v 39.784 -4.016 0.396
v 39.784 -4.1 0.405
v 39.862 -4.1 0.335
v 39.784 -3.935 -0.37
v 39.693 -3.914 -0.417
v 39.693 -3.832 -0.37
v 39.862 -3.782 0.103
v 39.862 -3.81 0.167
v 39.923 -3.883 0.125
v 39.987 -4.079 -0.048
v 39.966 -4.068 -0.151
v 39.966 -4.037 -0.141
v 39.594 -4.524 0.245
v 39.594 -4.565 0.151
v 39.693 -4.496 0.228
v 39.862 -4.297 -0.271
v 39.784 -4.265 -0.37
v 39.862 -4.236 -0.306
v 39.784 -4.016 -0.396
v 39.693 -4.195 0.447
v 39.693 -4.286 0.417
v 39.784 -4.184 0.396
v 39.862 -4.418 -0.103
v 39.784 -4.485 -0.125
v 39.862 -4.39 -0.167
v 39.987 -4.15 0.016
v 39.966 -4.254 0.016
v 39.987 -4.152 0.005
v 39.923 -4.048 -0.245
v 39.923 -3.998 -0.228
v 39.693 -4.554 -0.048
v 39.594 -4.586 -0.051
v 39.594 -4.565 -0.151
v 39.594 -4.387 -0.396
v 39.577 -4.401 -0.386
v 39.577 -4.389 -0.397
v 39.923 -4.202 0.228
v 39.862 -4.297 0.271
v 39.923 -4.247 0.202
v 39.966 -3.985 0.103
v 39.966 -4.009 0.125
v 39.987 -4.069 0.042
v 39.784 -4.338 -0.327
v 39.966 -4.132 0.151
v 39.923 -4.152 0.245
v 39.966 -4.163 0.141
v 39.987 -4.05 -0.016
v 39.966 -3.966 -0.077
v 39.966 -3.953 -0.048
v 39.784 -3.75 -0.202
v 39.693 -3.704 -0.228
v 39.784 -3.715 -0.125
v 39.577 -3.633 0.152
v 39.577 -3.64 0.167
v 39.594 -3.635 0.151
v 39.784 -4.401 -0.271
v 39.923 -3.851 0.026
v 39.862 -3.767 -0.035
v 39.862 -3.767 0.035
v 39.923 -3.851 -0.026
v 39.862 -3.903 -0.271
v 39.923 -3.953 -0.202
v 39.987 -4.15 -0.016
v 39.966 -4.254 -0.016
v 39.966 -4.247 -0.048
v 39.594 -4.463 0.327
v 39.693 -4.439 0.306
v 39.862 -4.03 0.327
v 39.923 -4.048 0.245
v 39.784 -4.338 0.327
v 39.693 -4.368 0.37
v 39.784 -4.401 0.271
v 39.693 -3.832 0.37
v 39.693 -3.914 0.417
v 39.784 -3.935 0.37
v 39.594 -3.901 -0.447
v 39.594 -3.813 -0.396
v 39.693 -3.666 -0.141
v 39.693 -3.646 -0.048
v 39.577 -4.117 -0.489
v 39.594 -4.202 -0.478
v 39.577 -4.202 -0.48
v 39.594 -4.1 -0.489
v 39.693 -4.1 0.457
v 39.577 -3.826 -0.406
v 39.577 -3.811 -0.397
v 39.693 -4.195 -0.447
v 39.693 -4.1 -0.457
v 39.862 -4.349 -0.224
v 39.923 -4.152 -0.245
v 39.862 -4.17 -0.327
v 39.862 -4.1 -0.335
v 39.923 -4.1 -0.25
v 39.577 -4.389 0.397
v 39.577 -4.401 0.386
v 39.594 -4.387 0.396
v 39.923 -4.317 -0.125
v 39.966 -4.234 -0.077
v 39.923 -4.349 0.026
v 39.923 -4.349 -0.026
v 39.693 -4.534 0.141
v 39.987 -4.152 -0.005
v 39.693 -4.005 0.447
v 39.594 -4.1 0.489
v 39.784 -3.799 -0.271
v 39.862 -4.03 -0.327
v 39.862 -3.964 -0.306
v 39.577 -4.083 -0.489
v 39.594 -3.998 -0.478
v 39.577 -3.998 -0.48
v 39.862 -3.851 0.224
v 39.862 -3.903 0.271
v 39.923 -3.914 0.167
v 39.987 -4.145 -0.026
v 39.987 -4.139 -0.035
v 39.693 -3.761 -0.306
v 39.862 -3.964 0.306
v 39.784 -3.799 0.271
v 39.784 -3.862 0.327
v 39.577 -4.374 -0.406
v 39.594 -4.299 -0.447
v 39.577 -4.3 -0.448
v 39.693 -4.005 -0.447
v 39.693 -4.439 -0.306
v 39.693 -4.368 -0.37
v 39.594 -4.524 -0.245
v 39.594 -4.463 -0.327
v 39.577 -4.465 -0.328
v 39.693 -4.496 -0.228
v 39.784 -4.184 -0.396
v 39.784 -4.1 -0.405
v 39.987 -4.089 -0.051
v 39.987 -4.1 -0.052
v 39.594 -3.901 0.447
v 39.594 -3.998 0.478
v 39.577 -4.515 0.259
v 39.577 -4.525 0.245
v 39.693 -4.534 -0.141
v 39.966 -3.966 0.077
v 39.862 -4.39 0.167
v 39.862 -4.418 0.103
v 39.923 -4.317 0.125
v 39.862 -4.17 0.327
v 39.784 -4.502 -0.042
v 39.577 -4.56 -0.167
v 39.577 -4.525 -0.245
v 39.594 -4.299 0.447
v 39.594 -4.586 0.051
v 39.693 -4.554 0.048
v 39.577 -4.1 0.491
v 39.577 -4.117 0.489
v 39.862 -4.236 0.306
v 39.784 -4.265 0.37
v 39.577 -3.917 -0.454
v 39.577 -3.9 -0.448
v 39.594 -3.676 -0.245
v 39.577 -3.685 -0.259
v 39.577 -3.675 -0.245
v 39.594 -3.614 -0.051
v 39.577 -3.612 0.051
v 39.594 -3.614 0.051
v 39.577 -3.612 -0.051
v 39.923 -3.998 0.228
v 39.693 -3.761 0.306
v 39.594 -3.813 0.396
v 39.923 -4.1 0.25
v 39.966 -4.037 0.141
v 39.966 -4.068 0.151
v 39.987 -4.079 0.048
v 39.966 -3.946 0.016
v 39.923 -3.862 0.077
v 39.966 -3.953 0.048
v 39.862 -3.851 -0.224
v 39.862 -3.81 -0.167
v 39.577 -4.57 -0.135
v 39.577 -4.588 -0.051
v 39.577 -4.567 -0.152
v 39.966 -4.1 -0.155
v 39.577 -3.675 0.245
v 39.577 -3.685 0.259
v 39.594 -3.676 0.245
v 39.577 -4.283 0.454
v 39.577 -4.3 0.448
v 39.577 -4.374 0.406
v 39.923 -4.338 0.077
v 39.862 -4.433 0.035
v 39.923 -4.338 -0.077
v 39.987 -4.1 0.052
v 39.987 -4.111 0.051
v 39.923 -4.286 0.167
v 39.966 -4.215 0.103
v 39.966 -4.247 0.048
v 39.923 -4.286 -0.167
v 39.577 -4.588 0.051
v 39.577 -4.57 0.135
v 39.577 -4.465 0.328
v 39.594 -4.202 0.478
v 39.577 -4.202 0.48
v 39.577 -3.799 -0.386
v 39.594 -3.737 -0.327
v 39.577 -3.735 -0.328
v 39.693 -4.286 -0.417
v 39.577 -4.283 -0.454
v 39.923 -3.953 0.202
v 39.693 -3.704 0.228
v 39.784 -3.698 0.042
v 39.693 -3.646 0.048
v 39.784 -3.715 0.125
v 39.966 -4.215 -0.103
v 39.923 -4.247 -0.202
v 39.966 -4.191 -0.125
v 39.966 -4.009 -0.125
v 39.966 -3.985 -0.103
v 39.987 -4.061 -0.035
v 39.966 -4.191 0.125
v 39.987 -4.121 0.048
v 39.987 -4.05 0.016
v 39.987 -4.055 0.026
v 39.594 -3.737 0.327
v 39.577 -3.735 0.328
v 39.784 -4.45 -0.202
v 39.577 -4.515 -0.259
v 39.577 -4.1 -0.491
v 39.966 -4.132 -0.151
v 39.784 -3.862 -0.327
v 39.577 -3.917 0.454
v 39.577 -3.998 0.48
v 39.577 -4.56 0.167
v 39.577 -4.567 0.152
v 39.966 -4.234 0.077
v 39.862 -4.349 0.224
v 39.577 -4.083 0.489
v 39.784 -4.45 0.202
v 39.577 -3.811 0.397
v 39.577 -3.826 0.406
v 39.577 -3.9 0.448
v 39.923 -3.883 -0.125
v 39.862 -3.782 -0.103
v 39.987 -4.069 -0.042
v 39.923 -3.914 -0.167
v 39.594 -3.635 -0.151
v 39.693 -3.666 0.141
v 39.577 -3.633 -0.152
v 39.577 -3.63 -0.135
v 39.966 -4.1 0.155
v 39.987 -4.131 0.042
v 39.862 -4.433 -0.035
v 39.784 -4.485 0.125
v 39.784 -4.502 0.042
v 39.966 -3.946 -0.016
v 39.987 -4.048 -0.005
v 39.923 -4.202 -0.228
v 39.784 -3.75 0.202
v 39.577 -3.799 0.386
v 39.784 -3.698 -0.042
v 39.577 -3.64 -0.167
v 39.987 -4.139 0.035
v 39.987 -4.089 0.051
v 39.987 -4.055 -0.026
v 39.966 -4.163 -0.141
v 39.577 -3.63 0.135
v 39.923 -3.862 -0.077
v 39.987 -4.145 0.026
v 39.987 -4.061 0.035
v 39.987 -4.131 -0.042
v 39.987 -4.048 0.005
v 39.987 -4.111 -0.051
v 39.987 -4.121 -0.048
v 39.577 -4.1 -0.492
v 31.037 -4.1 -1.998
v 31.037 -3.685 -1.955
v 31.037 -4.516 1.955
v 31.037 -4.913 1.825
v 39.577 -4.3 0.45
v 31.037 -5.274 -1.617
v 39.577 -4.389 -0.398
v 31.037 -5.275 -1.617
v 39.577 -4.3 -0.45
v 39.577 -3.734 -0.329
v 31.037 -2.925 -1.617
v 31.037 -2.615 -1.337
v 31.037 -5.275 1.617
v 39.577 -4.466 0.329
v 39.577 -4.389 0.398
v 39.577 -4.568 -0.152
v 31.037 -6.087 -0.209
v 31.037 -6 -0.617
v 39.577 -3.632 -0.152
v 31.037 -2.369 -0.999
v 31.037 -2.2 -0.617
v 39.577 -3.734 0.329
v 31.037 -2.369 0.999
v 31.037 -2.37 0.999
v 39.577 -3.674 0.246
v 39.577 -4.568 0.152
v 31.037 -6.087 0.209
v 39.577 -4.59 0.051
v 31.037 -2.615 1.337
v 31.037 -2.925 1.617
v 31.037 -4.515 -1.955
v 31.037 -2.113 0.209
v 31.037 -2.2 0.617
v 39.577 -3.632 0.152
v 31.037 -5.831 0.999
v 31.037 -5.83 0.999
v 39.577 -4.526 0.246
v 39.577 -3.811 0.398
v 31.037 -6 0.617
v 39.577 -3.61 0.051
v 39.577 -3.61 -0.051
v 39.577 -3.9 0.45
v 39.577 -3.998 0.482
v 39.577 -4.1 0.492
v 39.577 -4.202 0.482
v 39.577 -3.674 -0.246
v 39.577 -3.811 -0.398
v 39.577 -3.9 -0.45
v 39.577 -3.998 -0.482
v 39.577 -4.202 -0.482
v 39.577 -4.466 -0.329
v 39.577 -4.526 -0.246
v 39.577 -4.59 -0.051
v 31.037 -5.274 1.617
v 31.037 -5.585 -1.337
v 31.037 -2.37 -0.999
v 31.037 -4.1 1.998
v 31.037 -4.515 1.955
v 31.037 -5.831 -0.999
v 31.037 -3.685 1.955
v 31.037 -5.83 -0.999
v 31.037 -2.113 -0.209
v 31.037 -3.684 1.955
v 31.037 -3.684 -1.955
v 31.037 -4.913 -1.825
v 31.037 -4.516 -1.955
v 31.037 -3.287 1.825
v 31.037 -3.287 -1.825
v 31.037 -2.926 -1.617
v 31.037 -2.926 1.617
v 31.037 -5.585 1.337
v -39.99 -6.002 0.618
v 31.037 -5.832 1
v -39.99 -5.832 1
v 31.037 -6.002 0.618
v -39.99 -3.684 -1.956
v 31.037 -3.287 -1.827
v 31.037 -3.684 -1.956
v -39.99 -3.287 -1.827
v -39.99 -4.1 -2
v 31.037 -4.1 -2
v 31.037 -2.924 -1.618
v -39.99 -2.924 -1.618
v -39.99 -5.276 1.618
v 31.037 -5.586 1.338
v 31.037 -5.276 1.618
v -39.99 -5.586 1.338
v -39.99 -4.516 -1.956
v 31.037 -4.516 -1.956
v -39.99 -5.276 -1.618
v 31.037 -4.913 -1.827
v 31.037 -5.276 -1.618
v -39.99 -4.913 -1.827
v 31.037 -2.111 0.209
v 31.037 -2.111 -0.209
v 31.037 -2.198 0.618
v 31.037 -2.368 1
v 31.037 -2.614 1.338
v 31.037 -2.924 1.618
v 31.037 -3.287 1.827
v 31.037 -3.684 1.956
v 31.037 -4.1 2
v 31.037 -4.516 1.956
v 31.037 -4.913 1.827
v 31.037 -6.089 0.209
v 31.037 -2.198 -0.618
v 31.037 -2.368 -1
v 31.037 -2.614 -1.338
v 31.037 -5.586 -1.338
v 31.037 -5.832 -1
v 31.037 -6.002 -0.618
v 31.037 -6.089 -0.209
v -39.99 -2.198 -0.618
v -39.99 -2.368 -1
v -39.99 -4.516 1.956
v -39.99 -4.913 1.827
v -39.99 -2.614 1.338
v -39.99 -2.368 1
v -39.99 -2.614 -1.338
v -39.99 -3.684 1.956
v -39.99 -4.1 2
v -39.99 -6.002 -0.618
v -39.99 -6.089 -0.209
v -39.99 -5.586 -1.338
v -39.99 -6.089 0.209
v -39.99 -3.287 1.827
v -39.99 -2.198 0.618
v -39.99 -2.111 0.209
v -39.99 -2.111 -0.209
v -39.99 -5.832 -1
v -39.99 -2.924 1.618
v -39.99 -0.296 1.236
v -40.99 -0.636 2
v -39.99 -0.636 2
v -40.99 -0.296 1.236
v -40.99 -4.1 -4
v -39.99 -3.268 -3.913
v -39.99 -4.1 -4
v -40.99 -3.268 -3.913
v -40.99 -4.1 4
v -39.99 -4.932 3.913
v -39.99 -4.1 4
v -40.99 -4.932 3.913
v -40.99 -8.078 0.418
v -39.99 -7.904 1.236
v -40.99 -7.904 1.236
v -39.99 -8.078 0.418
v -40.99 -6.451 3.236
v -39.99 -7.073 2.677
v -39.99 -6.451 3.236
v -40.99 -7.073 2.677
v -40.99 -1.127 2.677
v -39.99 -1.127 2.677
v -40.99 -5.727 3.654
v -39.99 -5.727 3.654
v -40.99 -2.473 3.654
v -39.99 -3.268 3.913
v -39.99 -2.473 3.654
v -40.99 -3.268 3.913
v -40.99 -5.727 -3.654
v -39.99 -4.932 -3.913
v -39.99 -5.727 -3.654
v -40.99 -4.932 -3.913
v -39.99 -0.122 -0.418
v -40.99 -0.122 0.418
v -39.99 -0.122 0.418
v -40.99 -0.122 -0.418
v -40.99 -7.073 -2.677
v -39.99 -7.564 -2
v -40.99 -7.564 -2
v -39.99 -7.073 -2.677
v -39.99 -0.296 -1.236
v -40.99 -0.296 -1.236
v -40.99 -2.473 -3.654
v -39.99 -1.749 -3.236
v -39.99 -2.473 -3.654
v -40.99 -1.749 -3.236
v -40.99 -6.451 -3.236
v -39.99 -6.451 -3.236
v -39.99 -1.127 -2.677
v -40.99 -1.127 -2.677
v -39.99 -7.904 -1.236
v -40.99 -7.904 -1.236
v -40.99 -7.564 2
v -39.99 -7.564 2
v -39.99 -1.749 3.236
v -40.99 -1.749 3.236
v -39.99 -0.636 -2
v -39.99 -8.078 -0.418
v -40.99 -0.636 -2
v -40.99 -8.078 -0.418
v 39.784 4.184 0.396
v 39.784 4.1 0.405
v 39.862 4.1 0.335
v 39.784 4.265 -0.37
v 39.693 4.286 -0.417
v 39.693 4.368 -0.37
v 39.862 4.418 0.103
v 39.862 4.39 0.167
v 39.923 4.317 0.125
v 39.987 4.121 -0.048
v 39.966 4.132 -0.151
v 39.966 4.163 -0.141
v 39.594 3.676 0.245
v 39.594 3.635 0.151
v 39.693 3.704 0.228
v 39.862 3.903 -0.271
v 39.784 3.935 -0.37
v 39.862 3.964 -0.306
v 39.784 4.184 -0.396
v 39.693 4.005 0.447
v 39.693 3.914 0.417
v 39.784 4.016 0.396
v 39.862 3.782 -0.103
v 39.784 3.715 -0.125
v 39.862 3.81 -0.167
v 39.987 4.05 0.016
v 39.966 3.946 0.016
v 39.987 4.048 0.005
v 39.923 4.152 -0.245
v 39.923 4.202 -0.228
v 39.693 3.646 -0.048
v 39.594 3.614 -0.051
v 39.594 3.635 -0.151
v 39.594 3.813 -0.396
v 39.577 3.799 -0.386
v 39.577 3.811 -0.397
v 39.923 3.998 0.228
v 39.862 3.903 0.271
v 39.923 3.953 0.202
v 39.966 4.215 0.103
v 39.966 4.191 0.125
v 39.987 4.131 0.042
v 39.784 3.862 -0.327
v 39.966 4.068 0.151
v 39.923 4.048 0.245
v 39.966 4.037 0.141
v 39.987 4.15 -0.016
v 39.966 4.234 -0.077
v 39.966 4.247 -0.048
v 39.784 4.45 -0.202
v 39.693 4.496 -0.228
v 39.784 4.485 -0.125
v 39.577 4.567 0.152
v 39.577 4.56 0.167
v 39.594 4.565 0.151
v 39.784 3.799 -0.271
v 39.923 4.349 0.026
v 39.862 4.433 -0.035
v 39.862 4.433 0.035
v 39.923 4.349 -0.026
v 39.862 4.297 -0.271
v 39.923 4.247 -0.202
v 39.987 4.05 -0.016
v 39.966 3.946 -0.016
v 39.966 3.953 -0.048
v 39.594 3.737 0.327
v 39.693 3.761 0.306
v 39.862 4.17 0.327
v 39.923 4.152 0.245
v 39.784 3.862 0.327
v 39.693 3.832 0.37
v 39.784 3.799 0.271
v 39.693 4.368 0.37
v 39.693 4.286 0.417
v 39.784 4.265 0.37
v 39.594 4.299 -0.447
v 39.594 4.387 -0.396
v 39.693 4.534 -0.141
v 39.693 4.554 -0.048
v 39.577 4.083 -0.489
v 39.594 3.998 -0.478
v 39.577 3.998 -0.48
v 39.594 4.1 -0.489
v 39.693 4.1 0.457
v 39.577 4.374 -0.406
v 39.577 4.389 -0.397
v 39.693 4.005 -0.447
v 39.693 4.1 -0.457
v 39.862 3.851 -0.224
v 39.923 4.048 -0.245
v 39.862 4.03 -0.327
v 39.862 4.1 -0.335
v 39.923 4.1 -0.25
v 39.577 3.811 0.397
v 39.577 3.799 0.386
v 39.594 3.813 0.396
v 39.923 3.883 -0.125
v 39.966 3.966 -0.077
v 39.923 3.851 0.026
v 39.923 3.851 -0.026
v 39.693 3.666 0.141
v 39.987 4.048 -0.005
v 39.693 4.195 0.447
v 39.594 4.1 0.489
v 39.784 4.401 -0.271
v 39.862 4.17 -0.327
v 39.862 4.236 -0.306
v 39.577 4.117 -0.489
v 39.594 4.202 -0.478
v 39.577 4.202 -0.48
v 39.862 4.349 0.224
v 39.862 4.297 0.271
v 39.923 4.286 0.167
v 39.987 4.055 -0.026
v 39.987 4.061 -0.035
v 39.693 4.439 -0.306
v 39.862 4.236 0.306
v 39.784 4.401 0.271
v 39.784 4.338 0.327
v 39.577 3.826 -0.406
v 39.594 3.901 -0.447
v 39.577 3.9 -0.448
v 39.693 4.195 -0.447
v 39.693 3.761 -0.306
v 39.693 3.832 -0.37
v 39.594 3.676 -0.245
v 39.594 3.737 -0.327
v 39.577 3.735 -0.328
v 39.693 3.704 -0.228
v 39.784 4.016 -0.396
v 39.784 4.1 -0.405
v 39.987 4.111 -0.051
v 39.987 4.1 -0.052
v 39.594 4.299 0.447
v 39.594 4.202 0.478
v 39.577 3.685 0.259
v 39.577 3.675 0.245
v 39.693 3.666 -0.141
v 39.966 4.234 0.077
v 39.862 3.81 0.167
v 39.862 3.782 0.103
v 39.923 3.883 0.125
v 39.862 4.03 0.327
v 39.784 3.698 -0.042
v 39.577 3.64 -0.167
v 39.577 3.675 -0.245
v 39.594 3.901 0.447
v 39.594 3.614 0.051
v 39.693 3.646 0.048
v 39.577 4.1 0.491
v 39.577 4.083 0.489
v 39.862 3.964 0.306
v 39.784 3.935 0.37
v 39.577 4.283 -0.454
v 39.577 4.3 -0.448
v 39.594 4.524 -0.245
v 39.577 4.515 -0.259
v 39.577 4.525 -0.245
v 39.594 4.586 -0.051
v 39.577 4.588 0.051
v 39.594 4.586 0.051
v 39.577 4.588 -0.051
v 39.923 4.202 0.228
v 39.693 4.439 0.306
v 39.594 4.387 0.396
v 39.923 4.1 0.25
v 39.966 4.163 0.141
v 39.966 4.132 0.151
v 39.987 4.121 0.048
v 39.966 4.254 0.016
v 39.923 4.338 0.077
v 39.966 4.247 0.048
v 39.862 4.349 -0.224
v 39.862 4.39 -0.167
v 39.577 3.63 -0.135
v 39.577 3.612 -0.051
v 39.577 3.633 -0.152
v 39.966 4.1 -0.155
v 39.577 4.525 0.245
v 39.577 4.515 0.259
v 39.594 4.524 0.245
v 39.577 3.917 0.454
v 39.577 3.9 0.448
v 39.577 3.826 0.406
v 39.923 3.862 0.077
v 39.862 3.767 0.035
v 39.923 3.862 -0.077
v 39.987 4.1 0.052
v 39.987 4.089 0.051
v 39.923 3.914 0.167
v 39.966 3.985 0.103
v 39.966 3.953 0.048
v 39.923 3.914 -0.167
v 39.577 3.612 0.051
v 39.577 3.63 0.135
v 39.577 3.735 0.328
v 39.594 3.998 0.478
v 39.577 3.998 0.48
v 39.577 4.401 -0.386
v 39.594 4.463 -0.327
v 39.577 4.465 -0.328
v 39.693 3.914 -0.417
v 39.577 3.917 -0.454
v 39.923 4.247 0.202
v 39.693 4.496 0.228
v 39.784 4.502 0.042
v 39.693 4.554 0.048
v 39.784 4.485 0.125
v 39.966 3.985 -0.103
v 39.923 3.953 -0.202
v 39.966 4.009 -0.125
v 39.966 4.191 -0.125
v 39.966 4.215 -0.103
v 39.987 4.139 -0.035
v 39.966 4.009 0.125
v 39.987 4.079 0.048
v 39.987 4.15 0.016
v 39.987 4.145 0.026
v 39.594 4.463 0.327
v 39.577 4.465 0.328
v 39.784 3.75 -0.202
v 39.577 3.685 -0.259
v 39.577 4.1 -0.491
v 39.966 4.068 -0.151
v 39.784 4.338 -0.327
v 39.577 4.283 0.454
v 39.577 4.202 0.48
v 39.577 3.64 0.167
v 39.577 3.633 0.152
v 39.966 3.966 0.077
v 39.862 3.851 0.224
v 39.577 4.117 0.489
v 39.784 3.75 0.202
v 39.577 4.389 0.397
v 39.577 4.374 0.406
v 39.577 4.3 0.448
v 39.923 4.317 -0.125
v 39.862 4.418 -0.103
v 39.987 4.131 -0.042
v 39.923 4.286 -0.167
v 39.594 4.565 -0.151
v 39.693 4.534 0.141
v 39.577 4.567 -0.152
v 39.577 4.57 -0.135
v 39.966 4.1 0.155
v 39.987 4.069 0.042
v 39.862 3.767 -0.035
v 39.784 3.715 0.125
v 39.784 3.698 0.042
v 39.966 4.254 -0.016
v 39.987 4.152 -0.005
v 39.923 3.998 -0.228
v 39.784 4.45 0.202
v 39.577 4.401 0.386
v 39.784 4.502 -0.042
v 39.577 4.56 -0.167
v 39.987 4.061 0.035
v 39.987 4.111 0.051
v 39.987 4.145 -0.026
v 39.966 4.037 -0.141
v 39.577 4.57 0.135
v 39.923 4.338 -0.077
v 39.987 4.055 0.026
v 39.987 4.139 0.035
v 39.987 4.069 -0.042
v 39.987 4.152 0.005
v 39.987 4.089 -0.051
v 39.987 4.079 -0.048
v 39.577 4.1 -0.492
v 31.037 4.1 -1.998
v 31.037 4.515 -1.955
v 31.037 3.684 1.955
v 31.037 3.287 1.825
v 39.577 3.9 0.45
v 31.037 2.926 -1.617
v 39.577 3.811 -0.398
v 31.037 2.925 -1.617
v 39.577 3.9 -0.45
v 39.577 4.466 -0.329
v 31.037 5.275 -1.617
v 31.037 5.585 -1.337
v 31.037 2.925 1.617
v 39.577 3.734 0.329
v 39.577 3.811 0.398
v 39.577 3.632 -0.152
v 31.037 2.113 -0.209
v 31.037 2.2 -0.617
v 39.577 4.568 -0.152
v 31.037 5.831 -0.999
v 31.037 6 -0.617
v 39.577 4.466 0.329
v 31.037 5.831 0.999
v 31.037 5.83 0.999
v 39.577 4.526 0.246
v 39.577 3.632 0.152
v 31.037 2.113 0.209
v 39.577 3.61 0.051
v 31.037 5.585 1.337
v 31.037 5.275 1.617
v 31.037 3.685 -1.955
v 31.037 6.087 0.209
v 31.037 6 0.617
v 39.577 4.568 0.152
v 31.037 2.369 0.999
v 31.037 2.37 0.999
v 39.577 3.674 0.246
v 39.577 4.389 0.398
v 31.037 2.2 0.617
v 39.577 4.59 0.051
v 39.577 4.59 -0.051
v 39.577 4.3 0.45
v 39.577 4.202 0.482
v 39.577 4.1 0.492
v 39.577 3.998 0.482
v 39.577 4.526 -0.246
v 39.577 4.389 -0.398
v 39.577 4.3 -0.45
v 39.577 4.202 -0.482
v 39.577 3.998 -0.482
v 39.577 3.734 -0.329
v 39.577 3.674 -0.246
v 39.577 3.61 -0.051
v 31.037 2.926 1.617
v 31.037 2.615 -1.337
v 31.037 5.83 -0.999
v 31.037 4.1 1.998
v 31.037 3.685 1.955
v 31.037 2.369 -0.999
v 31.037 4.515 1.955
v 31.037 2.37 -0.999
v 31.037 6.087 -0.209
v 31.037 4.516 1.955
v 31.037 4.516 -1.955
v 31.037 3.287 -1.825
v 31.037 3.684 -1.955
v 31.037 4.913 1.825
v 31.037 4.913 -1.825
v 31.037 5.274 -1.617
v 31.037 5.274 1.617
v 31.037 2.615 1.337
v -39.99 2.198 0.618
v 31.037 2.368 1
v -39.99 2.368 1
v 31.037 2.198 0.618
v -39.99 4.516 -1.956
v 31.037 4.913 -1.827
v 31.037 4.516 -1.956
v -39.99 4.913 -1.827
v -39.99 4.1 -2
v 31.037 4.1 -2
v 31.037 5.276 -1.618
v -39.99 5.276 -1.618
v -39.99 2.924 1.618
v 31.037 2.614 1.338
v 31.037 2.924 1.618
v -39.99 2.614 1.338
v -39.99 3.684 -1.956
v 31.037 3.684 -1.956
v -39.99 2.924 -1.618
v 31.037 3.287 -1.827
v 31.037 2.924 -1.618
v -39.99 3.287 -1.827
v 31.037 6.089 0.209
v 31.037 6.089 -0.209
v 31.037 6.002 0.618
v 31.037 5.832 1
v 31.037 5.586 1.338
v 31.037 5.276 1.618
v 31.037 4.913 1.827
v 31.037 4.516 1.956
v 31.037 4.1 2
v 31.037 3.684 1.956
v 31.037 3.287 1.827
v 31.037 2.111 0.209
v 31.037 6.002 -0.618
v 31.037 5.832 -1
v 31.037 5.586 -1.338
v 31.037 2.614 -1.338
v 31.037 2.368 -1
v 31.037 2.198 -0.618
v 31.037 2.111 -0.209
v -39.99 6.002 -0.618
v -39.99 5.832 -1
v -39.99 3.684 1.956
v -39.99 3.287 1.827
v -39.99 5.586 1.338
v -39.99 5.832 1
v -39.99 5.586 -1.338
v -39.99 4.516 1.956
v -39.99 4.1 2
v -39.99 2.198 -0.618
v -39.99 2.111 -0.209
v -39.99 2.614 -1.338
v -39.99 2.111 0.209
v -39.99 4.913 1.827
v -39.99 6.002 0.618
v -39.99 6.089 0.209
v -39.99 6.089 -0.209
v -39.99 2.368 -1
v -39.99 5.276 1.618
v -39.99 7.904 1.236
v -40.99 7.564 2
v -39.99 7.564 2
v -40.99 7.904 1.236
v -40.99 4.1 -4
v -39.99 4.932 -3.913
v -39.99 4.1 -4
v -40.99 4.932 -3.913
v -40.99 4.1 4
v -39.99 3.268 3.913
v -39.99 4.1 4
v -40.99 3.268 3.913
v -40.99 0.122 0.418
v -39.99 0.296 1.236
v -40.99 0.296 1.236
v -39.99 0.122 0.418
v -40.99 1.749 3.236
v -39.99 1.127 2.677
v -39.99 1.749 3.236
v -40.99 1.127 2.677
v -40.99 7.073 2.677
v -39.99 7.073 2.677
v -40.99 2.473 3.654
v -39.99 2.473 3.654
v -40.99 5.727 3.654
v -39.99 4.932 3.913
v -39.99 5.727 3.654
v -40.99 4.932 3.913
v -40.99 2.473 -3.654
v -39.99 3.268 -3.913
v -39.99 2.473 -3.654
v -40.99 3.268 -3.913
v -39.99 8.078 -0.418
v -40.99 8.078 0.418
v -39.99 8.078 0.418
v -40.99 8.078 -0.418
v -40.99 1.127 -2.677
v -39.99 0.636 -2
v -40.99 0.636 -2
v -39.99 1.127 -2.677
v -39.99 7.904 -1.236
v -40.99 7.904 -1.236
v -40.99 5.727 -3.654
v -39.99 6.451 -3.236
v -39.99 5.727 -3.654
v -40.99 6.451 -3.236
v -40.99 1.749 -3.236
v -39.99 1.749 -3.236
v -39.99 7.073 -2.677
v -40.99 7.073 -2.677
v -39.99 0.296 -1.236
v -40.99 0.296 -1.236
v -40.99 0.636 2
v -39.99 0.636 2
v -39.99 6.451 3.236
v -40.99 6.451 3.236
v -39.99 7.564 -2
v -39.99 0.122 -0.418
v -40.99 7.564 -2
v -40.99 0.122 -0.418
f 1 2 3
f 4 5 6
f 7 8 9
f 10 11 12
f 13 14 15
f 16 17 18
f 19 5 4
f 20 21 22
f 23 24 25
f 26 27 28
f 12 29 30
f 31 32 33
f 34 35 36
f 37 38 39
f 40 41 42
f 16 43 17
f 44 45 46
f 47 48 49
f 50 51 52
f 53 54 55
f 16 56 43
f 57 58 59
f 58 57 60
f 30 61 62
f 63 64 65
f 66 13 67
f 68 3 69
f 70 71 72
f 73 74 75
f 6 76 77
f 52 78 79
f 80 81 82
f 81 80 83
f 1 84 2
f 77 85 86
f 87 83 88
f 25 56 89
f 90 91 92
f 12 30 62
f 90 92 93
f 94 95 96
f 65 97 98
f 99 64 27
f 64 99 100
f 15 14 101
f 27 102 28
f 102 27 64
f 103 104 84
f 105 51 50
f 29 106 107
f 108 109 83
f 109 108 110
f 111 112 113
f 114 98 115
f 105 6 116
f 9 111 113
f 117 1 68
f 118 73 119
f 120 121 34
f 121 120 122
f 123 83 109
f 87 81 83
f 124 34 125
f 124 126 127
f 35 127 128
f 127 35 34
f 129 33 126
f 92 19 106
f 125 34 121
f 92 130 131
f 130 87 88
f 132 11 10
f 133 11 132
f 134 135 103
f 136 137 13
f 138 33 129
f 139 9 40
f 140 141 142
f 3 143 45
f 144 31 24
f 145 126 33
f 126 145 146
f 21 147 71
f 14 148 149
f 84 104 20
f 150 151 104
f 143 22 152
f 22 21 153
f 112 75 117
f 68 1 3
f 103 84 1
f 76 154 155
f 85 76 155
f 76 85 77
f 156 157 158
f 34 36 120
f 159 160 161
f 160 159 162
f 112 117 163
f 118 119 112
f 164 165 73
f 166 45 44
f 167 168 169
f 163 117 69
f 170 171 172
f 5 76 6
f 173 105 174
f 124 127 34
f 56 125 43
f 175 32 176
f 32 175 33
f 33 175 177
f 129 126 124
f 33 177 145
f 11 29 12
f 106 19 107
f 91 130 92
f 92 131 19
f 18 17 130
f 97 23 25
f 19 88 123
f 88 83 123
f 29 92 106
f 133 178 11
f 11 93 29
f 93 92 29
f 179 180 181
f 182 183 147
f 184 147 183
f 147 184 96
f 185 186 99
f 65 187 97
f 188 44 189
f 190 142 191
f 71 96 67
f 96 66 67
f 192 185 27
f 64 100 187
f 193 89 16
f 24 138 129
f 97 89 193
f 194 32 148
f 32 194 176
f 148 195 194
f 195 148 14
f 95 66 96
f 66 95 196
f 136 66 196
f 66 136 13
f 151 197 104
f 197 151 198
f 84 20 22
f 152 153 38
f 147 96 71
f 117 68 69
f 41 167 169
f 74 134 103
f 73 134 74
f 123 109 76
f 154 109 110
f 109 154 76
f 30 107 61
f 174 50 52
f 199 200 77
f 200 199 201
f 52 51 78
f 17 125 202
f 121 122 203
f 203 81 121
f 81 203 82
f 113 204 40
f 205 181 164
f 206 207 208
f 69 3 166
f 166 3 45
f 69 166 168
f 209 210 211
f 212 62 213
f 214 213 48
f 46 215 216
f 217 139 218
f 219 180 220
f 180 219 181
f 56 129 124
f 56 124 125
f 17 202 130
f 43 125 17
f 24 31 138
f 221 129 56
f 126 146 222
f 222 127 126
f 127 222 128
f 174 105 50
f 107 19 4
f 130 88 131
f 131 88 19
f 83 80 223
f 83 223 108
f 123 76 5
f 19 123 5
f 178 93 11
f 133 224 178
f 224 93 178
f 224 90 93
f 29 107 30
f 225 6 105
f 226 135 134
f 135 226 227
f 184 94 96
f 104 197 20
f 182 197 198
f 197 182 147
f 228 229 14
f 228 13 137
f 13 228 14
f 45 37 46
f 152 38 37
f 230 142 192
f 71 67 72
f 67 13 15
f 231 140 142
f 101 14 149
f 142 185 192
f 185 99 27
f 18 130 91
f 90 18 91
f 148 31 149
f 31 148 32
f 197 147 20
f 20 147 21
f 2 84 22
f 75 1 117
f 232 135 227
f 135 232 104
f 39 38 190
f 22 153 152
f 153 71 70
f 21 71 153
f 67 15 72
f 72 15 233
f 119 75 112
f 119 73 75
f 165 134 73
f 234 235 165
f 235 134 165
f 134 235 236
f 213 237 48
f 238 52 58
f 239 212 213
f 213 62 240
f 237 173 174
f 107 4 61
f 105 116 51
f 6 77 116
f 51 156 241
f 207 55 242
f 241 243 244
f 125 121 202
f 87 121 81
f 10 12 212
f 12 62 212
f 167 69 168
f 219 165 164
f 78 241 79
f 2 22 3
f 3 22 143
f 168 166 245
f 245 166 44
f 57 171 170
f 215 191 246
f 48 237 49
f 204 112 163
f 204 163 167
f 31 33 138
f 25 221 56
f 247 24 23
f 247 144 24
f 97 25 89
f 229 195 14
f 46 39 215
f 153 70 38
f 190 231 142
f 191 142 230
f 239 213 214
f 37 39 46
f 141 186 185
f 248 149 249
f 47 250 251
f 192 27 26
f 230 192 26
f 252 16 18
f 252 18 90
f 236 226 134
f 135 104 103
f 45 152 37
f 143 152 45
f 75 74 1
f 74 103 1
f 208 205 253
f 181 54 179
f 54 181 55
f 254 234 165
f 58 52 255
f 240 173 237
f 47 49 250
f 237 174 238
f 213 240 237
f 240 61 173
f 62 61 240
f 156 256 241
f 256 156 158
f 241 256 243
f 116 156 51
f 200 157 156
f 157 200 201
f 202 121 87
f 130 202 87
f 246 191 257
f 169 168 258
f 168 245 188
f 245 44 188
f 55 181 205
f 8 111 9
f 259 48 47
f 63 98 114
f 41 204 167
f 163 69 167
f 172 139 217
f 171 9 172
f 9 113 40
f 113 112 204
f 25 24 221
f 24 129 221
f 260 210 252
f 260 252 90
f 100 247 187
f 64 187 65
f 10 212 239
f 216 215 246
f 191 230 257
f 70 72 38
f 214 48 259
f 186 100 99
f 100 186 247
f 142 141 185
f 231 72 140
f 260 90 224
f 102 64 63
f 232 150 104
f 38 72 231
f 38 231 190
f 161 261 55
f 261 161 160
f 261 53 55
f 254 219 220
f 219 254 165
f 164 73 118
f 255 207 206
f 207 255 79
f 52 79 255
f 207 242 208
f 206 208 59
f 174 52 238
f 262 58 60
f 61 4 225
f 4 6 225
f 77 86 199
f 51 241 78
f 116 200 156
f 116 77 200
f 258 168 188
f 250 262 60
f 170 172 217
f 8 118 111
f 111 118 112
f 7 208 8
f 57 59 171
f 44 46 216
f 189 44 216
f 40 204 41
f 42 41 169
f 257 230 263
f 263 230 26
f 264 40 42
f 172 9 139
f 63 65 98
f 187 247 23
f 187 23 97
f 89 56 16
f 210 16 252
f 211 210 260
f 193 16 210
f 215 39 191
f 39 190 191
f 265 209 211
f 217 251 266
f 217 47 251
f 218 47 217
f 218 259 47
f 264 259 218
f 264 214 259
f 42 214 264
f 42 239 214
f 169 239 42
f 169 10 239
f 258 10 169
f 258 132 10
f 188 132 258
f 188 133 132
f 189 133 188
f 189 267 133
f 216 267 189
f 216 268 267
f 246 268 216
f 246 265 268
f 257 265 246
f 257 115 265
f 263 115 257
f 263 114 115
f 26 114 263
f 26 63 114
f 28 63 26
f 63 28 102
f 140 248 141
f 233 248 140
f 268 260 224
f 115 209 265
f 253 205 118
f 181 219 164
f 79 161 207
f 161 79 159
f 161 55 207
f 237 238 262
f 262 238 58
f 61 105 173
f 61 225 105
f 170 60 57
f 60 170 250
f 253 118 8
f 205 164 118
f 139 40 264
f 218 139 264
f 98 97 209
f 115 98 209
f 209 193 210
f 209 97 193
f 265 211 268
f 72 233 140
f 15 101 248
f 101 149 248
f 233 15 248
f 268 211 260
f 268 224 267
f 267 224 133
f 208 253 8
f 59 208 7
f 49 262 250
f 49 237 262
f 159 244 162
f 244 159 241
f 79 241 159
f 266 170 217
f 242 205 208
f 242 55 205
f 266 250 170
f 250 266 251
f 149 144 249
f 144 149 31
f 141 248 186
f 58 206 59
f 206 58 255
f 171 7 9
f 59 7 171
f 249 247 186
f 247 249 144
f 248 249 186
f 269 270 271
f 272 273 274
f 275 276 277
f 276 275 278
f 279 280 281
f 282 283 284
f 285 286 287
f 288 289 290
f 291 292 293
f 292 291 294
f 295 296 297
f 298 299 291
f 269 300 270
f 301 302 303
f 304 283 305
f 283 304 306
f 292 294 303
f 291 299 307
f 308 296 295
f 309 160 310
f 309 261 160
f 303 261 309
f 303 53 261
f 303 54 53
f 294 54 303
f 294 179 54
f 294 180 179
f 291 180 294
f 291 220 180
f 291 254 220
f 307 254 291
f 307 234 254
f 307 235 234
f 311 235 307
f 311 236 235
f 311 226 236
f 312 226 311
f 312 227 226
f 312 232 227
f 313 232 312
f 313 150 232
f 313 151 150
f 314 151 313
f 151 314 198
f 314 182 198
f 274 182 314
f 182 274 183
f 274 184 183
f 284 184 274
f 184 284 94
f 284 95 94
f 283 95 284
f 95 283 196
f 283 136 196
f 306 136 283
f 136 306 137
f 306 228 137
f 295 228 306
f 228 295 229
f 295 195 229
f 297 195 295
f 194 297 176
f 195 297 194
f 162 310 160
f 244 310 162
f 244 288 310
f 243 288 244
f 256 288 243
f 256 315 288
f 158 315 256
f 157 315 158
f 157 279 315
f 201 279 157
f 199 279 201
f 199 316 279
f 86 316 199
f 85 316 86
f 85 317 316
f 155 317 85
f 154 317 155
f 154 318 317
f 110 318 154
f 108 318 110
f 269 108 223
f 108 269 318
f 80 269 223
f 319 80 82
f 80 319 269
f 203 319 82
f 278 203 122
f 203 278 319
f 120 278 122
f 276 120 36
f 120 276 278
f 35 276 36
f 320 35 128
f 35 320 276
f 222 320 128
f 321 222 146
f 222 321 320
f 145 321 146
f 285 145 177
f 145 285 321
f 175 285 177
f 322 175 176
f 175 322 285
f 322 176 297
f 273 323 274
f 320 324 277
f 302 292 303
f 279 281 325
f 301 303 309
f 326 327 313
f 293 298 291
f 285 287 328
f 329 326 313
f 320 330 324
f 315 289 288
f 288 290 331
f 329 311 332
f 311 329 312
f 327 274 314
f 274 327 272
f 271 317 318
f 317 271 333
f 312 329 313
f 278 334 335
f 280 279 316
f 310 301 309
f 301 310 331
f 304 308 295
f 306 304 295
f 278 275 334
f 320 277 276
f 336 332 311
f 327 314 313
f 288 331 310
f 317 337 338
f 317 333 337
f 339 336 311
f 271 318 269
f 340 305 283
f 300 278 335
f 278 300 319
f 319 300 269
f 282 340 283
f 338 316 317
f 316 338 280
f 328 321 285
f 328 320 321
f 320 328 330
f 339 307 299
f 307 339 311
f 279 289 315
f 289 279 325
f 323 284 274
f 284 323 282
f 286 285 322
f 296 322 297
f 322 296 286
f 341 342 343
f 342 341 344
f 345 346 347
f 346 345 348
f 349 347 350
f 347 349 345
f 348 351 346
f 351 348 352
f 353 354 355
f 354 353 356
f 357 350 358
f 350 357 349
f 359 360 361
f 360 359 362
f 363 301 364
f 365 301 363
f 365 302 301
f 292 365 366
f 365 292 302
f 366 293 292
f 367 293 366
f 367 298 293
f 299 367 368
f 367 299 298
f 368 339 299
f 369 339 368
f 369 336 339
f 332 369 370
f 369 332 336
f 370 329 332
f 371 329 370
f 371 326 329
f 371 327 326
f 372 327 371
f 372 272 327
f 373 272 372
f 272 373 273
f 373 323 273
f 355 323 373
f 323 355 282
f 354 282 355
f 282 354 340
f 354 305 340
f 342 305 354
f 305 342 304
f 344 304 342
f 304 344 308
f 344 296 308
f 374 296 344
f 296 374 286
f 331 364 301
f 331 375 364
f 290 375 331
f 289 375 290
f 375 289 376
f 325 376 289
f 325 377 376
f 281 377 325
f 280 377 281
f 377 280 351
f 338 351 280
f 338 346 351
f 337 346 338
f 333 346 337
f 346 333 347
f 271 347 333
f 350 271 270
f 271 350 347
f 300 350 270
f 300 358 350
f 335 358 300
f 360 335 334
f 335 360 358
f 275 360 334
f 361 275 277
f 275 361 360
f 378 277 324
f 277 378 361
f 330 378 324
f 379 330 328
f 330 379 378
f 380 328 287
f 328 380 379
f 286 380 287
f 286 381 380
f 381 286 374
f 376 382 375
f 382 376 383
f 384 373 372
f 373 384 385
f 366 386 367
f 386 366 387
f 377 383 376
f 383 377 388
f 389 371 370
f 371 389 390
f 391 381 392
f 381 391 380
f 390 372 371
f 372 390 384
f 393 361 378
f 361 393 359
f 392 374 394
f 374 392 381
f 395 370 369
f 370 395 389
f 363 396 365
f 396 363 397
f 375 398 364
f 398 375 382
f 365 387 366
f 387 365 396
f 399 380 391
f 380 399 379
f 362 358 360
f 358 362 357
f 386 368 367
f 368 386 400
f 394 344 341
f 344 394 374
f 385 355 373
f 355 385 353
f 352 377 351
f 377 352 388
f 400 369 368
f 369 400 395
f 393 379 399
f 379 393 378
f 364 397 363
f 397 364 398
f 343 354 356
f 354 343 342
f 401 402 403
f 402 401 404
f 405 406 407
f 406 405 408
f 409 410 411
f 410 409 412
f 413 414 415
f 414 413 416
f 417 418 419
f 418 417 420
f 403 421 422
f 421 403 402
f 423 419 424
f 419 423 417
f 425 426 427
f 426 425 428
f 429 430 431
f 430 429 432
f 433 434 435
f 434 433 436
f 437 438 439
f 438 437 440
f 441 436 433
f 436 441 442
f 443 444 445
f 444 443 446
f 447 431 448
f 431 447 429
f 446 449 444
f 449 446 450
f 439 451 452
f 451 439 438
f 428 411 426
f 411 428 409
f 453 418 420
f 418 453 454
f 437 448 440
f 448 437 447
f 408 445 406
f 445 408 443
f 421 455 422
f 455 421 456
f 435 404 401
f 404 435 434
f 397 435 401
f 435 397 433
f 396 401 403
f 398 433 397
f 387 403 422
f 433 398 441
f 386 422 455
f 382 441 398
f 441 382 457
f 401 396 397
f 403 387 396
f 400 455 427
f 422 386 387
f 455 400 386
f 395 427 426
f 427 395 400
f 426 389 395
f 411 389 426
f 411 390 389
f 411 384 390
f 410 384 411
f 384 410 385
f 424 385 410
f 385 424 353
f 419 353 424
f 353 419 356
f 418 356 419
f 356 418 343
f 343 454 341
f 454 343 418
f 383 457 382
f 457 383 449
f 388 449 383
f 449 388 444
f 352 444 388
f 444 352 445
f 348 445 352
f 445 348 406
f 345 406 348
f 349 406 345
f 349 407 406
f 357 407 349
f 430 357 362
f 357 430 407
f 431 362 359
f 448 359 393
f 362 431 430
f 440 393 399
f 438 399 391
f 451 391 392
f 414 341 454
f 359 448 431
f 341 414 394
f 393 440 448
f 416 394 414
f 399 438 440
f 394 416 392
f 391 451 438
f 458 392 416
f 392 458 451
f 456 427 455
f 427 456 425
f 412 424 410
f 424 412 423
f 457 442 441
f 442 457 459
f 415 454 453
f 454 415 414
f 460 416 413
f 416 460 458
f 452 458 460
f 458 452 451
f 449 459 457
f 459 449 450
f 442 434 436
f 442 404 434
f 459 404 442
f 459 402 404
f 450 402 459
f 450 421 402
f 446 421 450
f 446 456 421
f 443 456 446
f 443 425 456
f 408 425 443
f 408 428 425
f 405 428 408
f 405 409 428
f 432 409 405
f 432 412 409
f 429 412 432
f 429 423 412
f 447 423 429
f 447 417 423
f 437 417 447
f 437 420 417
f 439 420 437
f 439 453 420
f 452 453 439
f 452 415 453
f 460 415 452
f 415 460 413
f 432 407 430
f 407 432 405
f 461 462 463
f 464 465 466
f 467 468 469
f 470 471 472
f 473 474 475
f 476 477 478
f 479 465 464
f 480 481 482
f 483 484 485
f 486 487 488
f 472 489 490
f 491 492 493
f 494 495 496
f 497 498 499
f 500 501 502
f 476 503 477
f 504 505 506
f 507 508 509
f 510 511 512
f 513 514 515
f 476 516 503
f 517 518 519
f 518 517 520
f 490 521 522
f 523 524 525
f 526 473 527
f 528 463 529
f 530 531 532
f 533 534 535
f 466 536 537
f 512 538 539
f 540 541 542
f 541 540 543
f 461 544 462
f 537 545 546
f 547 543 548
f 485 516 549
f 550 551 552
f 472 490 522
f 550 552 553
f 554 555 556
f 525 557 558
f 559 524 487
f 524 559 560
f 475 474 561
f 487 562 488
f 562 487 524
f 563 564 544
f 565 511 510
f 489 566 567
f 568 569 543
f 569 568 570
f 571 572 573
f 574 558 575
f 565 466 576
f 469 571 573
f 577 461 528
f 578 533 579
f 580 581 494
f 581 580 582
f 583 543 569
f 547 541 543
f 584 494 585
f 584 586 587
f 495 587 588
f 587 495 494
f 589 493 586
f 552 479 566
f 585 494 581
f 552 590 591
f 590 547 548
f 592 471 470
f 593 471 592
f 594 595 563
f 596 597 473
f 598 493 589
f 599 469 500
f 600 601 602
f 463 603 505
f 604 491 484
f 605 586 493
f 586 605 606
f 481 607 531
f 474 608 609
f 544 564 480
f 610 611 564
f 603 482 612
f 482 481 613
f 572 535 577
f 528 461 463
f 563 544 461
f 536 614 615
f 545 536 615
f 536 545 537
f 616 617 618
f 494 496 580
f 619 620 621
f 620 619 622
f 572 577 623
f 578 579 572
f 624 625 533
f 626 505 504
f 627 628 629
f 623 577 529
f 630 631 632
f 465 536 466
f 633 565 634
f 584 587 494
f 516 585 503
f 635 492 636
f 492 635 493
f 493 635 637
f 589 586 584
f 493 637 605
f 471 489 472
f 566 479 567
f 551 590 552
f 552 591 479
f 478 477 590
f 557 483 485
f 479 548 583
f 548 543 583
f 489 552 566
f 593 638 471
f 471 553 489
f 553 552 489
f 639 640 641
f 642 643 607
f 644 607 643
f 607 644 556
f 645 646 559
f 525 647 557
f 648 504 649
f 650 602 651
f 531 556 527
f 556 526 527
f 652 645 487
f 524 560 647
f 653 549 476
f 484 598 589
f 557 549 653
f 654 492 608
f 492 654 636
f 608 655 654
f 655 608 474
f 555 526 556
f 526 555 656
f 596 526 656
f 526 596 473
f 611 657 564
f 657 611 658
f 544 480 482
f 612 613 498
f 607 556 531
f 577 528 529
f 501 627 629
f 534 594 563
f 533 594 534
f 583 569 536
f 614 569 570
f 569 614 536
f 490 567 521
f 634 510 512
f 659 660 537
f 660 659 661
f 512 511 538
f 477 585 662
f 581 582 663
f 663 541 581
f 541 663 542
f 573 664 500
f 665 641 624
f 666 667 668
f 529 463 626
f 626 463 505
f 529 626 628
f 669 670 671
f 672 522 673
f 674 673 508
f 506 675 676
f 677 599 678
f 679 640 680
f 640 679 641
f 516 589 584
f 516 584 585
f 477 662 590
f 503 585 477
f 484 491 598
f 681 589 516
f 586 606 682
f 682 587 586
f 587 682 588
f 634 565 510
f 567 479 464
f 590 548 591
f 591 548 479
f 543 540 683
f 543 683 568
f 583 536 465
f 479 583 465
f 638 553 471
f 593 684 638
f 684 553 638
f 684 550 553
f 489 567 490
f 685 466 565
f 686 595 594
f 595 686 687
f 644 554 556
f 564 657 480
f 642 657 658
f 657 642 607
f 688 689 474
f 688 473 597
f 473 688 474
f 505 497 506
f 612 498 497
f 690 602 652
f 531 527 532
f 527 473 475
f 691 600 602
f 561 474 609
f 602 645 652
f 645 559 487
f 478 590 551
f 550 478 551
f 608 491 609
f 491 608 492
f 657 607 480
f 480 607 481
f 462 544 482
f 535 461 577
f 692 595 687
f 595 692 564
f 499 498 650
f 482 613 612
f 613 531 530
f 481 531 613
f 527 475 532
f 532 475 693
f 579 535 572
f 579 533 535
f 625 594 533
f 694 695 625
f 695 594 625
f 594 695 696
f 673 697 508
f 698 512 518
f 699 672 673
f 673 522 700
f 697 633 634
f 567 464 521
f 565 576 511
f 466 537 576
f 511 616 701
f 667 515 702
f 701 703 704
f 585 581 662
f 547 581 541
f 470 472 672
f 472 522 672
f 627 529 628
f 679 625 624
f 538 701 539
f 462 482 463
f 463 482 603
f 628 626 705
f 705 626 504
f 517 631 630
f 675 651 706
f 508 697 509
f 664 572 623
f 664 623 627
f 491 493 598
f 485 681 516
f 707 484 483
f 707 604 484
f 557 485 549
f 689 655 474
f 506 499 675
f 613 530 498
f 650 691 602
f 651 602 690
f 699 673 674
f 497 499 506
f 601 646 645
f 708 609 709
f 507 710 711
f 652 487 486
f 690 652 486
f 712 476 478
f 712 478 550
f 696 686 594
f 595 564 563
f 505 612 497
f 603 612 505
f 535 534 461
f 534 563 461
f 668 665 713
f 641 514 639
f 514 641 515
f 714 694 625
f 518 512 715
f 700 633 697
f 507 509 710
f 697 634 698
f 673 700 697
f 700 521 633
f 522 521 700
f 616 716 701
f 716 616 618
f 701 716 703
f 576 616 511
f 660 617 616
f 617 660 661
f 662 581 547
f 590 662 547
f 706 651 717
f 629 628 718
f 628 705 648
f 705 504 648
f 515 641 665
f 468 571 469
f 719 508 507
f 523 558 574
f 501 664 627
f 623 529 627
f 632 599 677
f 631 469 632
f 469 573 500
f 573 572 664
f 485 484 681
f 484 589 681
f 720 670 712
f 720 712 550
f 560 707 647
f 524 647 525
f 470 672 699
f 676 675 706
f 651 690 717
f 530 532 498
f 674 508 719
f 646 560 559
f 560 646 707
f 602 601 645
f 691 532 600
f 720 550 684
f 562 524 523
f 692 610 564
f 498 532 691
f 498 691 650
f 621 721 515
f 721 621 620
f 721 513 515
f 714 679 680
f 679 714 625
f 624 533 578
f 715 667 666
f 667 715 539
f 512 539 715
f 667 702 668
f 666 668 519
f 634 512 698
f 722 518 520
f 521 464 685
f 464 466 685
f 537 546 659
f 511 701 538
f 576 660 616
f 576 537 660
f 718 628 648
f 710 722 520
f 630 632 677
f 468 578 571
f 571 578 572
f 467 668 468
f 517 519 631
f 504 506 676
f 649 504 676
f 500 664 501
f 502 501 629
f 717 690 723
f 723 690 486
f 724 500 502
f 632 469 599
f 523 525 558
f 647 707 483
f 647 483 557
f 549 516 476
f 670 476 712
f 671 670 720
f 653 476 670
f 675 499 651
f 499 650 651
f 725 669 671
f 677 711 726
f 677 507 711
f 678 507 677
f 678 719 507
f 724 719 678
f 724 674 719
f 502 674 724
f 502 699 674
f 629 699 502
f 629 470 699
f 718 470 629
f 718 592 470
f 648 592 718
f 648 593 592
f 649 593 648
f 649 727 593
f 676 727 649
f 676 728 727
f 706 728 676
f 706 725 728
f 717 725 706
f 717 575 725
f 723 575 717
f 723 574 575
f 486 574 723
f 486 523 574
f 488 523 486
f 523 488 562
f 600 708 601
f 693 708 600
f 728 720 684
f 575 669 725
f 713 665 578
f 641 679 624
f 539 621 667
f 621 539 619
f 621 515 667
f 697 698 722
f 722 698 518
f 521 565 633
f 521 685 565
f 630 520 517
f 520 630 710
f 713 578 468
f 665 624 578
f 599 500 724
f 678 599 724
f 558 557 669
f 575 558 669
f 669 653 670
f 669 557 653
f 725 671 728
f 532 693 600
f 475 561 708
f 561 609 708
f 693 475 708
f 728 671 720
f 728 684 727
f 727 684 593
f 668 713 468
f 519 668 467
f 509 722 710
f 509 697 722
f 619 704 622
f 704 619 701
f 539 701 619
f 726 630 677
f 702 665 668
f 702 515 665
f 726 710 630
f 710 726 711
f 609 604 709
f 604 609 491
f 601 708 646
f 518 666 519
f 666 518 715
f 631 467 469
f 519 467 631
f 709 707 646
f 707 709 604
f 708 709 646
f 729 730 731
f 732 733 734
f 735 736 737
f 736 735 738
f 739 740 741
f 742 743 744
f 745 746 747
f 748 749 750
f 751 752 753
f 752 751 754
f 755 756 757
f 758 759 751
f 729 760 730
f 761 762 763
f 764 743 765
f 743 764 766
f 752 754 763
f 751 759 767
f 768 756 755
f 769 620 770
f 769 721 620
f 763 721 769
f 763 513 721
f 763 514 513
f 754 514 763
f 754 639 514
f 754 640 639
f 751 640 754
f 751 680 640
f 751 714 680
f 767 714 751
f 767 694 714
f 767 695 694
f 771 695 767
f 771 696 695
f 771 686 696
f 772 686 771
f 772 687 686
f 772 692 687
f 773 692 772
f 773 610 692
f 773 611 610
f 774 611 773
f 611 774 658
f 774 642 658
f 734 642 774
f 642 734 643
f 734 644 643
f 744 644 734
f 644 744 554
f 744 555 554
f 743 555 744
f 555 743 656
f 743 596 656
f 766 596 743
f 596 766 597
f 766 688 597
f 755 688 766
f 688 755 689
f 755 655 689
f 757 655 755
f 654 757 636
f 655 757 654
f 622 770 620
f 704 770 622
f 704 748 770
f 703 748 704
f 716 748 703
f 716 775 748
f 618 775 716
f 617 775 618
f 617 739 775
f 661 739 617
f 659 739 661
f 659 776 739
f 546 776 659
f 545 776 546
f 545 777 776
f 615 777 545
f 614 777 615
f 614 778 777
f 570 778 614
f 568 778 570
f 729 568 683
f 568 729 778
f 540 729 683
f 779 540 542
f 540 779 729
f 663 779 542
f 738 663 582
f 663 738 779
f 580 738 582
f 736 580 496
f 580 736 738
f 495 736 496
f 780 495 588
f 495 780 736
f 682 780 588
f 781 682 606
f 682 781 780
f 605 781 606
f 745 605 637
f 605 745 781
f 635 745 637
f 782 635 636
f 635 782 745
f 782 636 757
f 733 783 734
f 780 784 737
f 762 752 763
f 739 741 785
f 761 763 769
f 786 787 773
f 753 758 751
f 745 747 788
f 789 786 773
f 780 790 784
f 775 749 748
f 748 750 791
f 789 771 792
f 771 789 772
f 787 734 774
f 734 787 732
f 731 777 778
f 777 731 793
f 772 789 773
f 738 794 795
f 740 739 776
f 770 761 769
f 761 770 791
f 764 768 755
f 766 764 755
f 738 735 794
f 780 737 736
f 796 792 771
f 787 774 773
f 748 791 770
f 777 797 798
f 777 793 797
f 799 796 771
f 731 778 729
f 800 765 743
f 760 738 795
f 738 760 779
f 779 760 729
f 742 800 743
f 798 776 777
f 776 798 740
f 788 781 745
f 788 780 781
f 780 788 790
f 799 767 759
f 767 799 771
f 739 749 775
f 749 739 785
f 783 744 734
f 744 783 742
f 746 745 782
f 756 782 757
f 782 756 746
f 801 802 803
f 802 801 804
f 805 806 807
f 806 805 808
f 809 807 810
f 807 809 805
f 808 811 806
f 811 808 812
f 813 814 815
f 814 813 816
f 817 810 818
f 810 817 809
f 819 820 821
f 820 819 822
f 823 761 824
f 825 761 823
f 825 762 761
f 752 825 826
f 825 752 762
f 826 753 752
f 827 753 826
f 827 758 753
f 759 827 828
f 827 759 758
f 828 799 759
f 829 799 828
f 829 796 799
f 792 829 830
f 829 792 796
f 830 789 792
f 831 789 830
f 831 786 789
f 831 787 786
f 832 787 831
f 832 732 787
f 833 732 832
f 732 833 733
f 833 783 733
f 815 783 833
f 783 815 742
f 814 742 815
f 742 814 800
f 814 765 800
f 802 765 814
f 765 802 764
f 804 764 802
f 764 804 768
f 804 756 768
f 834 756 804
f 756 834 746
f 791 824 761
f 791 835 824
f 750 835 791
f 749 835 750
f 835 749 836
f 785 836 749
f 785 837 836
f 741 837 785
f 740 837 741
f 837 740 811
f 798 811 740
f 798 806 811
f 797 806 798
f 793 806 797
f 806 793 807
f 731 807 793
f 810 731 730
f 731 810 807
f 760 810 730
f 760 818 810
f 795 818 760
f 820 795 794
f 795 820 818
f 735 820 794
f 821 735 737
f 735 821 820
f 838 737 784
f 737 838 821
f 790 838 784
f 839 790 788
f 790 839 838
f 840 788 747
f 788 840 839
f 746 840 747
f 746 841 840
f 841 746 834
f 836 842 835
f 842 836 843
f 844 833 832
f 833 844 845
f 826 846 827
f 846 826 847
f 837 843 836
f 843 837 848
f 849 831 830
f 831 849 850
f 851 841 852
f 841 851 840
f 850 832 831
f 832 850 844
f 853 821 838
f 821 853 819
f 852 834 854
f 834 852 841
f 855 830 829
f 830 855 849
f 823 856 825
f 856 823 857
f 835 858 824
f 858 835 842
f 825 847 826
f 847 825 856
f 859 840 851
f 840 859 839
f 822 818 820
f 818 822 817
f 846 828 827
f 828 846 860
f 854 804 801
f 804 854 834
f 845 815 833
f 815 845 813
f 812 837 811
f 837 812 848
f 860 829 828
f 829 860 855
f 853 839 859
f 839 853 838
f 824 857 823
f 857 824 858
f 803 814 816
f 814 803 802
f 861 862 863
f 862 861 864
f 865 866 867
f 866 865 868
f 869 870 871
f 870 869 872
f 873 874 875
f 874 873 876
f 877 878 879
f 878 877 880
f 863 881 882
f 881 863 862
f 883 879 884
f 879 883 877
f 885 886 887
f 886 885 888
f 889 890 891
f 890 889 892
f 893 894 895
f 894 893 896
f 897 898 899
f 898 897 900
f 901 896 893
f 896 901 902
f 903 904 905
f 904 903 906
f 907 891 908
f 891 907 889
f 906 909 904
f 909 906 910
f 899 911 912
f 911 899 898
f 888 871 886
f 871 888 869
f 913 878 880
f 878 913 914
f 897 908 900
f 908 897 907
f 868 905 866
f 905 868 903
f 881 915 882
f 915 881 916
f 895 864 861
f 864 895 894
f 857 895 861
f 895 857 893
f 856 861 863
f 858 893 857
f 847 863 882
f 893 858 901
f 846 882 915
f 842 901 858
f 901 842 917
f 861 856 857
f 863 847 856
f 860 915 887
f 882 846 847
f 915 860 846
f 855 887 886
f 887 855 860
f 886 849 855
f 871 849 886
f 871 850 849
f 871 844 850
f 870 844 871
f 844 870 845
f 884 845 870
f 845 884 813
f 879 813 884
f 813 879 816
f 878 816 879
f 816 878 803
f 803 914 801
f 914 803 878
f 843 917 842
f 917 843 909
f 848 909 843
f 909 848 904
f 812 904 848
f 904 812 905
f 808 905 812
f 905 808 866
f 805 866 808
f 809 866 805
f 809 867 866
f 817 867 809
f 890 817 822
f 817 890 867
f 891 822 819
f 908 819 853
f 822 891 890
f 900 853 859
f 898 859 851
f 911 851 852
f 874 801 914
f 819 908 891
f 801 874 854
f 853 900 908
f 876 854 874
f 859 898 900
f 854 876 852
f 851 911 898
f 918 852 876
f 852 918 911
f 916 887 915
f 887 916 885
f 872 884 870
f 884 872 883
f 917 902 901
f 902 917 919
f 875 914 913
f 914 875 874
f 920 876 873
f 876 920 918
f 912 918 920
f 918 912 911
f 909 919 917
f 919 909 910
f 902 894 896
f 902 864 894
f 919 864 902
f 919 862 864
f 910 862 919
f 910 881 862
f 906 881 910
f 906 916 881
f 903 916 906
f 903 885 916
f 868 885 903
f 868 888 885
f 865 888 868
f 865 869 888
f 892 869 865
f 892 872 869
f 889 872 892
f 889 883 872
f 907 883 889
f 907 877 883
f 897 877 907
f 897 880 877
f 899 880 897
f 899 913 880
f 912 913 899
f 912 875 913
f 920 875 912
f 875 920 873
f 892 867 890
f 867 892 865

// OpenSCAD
//Created by Ari M. Diacou, February 2014
//Shared under Creative Commons License: Attribution-ShareAlike 3.0 Unported (CC BY-SA 3.0) 
//see http://creativecommons.org/licenses/by-sa/3.0/

//Resolution, higher is smoother.
$fn=30; 
//Length of the needle in mm, tip+shaft.
Length=80; 
//Diameter of the needle in mm.
Diameter=4; 
//Angle that the tip makes.
Angle=20; 
//Of the tip - higher is sharper.
sharpness=4; 
//1=circular, 2=double pointed, 3=straight with butt.
needle_type=3; 
//Each needle produces 2 halves.
number_of_needles=2;
//The bore width that you will insert the filiment to make circular needles.
Wire_Width=2.7; 
//Do you want to slice the needles in half (to make it easier to print on a fused filiment fabricator)?
slice="false";//[true,false] 

/* HIDDEN */
e=0+.01; //Epsilon, a very small number used for ensuring water-tightness.
h=Angle/2;//Half angle. The equations required extensive use of the half angle.
D=Diameter;
R=D/(2*sharpness);//Radius of the sphere that dulls the tip
a=(D/2)*(cos(h)/sin(h))-R/sin(h); //The distance from the shaft/tip interface to the center of the rounding sphere placed on the tip.
L=Length-a-R; //Length of the shaft

if(slice=="true"){
	if(needle_type==1)	lineup(number_of_needles, D*1.2) prepare() circular_needle();
	if(needle_type==2)	lineup(number_of_needles, D*1.2) prepare() dp_needle();
	if(needle_type==3)	lineup(number_of_needles, D*2) prepare() straight_needle();
	}
if(slice=="false"){
	if(needle_type==1)	lineup(number_of_needles/2, D*1.2) prepare2() circular_needle();
	if(needle_type==2)	lineup(number_of_needles/2, D*1.2) prepare2() dp_needle();
	if(needle_type==3)	lineup(number_of_needles/2, D*2.05) prepare2() straight_needle();
	}

module shaft(){
	cylinder(h=L, r=D/2);
	}

module tip(){
	union(){
		translate([0,0,a])
			sphere(R);
		cylinder(h=a+R*sin(h),r1=D/2,r2=R*cos(h));
		}
	}

module back_tip(){ //a tip with a borehole in it to make a circular needle
	difference(){
		tip();
		translate([0,0,e]) cylinder(a+R/sin(h), r=Wire_Width/2);
		}
	}

module circular_needle(){ //a circular needle meant for inserting filiment into the back.
	union(){
		shaft();
		translate([0,0,L-e]) tip();
		translate([0,0,e]) mirror([0,0,1]) back_tip();
		}
	}

module straight_needle(){ //a straight needle with a bump at the end
	union(){
		shaft();
		translate([0,0,L-e]) tip();
		translate([0,0,e]) mirror([0,0,1]) cylinder(h=D/4,r=D);
		}
	}

module dp_needle(){ //a double pointed needle
	union(){
		shaft();
		translate([0,0,L-e]) tip();
		translate([0,0,e]) mirror([0,0,1]) tip();
		}
	}

module lineup(num, space) { //lines up 'num' things with 'space' between the centers of object child(0). Lined up on the y axis on either side of the xz plane.
   for (i = [-num : num-1])
     translate([ 0, space*(i+.5), 0 ]) child(0);
 }

module prepare(){ //Rotates from z-hat direction to x-hat direction, and deletes half
	difference(){
		rotate([0,90,0])	
			translate([0,0,-L/2]) 
				child(0);
		translate([0,0,-D/2-e])
			cube([L+2*(a+R+e),2*(D+e),D+e],center=true);
		}
	}	

module prepare2(){ //just rotation
		rotate([0,90,0])	
			translate([0,0,-Length/2]) 
				child(0);
	}
